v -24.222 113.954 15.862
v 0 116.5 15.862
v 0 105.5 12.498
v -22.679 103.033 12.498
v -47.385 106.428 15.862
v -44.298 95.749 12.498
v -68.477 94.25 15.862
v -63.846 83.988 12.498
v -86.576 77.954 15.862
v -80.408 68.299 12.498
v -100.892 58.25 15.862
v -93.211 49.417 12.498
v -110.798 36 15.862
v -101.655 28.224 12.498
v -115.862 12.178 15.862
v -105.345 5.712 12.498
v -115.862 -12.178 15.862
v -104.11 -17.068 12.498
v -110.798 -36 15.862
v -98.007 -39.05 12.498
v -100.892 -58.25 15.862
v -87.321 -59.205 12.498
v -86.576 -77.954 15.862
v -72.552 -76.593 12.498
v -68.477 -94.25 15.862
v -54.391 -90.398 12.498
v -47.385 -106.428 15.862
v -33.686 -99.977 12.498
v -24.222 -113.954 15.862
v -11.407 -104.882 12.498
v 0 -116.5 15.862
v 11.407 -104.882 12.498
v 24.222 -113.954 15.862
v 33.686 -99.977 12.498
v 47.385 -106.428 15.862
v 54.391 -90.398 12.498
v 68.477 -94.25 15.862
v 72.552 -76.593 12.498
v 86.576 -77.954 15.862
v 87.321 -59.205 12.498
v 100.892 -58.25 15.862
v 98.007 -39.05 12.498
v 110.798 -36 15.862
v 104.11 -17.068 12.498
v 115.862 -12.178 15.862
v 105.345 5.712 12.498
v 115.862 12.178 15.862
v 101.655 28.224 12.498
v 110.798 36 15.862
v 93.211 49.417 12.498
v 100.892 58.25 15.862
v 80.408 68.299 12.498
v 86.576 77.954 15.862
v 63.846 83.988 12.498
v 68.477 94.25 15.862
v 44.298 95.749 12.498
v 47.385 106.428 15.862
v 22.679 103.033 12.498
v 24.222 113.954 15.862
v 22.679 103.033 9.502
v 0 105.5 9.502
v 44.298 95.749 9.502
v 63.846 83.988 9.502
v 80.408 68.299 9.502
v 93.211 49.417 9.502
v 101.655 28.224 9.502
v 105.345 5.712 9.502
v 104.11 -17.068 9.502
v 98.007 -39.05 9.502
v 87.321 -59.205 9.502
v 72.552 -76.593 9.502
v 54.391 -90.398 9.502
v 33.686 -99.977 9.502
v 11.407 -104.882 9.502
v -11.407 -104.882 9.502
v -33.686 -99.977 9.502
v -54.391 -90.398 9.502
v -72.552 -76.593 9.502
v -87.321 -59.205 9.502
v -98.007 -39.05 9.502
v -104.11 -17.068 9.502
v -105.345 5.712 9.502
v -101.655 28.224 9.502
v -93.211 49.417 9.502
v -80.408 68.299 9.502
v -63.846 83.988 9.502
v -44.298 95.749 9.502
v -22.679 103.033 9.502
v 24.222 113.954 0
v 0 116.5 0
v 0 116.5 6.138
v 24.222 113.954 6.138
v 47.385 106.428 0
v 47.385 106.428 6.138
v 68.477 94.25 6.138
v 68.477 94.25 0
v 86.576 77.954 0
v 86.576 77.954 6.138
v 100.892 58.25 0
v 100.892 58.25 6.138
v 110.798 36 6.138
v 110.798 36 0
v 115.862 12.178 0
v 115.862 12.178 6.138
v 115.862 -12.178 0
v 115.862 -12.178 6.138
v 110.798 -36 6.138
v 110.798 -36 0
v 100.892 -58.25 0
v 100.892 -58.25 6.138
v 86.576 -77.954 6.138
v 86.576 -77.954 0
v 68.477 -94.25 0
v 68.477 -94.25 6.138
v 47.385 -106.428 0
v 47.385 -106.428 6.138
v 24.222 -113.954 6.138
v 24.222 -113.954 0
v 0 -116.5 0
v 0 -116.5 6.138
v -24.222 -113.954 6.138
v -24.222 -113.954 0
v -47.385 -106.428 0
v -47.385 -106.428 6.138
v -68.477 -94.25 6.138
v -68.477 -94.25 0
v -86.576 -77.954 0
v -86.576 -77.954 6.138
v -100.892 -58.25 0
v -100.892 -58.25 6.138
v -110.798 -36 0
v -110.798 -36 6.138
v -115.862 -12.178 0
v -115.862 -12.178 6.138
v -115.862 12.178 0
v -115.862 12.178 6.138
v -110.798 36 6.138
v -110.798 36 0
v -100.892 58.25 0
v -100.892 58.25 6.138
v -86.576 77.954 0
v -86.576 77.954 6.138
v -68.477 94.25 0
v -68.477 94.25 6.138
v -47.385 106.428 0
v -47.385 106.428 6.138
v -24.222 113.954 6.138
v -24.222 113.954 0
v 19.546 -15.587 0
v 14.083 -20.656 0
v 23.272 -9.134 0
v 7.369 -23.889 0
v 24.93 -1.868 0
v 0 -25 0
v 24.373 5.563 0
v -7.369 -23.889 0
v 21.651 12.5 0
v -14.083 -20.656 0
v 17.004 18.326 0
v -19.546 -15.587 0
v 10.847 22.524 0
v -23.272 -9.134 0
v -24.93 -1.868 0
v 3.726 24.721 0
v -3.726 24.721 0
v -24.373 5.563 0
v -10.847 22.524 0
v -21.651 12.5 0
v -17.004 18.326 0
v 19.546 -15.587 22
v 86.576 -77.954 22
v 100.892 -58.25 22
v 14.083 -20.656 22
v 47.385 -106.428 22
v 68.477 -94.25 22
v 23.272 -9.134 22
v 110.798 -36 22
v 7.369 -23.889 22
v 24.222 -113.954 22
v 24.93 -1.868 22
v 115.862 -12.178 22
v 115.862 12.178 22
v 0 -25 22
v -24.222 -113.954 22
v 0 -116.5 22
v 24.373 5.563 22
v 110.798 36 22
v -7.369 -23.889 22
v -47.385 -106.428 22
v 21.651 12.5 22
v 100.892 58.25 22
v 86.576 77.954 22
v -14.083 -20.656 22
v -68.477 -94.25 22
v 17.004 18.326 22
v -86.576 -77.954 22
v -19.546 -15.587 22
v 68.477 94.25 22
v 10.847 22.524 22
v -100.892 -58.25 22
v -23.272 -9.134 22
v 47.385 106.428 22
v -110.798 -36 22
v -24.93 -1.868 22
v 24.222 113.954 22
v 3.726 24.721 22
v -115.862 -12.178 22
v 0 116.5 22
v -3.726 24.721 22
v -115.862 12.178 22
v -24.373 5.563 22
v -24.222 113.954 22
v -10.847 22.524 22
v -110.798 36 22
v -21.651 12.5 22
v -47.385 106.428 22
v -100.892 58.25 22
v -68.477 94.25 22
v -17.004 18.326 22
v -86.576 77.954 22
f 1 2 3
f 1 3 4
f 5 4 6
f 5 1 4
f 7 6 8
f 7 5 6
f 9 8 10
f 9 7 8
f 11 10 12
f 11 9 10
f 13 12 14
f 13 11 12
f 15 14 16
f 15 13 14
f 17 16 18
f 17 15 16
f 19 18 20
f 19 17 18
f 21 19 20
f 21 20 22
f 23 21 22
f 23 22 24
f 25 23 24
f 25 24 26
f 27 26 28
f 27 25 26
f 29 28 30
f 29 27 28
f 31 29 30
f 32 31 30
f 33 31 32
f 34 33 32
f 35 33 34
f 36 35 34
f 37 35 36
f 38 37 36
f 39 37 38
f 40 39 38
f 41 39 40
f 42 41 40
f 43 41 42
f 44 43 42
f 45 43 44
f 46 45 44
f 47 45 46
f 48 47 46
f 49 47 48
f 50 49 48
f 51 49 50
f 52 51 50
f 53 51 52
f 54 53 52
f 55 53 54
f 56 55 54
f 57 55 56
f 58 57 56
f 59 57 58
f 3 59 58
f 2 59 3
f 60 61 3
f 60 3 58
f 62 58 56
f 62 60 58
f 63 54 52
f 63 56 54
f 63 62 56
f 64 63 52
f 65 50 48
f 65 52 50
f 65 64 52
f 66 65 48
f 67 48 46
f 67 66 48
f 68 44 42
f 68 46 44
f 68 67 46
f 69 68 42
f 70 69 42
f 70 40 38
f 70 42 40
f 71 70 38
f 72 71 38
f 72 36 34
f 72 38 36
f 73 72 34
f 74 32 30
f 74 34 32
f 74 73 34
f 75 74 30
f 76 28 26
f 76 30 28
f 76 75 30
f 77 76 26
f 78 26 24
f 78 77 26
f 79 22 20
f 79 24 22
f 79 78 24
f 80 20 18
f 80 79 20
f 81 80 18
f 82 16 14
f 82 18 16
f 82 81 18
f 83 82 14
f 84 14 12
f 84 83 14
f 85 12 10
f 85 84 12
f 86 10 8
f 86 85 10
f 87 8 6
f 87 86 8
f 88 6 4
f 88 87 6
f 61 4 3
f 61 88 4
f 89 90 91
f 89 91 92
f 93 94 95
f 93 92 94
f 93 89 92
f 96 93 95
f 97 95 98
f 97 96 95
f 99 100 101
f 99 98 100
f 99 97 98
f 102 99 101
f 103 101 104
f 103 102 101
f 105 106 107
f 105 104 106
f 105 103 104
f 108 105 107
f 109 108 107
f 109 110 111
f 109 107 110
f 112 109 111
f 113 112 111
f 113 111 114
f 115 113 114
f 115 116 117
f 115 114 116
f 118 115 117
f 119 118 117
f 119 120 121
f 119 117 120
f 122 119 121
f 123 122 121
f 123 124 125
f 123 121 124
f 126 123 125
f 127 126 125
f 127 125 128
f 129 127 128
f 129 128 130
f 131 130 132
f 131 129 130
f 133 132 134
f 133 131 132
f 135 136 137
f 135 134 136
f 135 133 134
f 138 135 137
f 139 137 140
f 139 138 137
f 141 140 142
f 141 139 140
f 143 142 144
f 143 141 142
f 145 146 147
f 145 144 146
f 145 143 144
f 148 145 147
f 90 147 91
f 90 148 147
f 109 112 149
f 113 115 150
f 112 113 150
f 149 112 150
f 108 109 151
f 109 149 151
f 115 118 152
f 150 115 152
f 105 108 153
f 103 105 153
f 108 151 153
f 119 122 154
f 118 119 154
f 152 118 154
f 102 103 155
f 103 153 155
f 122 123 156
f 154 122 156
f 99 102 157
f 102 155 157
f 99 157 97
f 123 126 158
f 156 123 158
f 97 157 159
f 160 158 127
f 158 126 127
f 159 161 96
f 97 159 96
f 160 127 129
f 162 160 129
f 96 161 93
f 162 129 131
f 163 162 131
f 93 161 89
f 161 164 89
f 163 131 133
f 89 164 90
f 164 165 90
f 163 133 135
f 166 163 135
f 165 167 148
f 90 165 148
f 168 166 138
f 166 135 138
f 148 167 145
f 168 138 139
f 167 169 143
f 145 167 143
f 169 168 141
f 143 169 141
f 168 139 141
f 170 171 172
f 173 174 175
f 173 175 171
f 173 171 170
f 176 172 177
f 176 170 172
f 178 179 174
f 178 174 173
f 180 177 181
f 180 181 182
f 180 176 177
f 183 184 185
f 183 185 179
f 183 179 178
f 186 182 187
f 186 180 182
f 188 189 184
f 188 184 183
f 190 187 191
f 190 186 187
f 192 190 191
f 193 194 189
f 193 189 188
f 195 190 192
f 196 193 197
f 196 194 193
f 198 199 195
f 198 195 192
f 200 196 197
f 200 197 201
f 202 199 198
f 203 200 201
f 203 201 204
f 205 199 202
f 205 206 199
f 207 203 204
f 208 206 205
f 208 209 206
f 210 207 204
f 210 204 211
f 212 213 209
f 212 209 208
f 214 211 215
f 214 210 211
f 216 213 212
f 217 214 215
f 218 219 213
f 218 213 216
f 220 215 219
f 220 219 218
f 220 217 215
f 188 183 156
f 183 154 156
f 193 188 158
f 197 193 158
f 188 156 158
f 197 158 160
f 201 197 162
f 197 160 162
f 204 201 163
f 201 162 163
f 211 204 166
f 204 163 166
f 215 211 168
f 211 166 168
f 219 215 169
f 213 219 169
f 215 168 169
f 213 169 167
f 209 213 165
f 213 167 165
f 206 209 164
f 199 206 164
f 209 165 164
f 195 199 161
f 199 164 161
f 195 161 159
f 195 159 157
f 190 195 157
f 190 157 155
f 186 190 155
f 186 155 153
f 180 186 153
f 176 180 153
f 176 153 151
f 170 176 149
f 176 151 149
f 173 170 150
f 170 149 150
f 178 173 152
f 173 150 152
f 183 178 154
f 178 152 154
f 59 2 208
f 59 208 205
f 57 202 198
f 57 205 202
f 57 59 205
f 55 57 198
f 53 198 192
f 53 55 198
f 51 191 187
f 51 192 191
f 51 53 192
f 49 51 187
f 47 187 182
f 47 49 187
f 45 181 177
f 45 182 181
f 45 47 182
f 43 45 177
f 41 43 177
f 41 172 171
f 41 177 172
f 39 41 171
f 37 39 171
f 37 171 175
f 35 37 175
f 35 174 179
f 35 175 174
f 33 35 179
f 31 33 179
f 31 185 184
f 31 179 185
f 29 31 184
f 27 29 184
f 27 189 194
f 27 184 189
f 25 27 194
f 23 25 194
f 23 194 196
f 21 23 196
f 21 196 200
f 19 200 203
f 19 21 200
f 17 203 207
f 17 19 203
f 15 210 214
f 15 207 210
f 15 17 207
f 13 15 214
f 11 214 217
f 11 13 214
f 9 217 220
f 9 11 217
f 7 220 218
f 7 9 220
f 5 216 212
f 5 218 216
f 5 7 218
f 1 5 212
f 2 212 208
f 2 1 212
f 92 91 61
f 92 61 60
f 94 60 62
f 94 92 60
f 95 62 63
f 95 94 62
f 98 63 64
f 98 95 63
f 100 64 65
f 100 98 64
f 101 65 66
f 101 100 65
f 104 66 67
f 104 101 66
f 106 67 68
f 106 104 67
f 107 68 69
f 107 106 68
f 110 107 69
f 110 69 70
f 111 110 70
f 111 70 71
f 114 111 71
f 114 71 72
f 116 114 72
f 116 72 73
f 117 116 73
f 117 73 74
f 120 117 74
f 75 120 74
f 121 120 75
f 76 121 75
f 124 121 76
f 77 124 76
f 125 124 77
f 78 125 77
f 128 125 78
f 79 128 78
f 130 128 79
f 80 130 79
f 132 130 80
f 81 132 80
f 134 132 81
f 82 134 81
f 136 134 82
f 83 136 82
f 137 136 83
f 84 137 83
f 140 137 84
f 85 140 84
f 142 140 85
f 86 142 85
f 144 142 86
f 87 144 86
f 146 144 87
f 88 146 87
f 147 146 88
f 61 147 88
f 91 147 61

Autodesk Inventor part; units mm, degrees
ref_plane "YZ Plane" through (0, 0, 0) normal (1, 0, 0) x (0, 1, 0)
ref_plane "XZ Plane" through (0, 0, 0) normal (0, 1, 0) x (-1, 0, 0)
sketch "Esquisse principale" plane through (0, 0, 0) normal (1, 0, 0) x (0, 1, 0)
  line L0 (0, 22) -> (116.5, 22)
  line L1 (116.5, 22) -> (116.5, 15.8615)
  line L2 (116.5, 15.8615) -> (105.5, 12.4984)
  line L3 (105.5, 12.4984) -> (105.5, 9.5016)
  line L4 (105.5, 9.5016) -> (116.5, 6.1385)
  line L5 (116.5, 6.1385) -> (116.5, 0)
  line L6 (116.5, 0) -> (0, 0)
  line L7 (114.5, 15.25) -> (114.5, 6.75) construction
  line L8 (105.5, 11) -> (114.5, 11) construction
  line L9 (116.5, 15.8615) -> (116.5, 6.1385)
  line L10 (0, -3.2) -> (0, 19.2) projected
  line L11 (0, 0) -> (0, 22)
  dimension "d0" = 8.5
  dimension "d1" = 34
  dimension "d2" = 2
  dimension "d6" = 22
  dimension "d21" = 229
  dimension "d25" = 11
  dimension "d27" = 11
ref_plane "Plan de courroie" through (0, 105.5, 11) normal (0, 0, 1) x (1, 0, 0)
revolve "Corps" add sketch "Esquisse principale" angle 360 about axis through (0, 0, -10) along (0, 0, 1)
revolve "Bord" cut sketch "Esquisse principale" angle 360 about axis through (0, 0, -10) along (0, 0, 1) contours L9 L4 L3 L2
fillet "Congé externe" [suppressed]
fillet "Congé interne" [suppressed]
pattern_of_one "Réseau de bords"
sketch "Esquisse2" plane through (0, 0, 22) normal (0, 0, 1) x (1, 0, 0)
  circle A0 centre (0, 0) radius 116.5 projected
hole "Perçage1" at (0, 0, 22) direction (0, 0, -1) diameter 50 depth 22
equation "\"d0\" = da_Bw"
equation "\"d1\" = da_Alfa"
equation "\"d2\" = da_c"
equation "\"d21\" = da_Dw"
equation "\"d25\" = da_Hd"
equation "\"d27\" = da_Se"
equation "\"da_r1\" = 0"
equation "\"da_r2\" = 0"
equation "\"d18\" = da_Sg"
equation "\"d5\" = da_Se"
equation "\"da_Bw\" = 8.5"
equation "\"da_Alfa\" = 34deg"
equation "\"da_c\" = 2"
equation "\"da_Dw\" = 229"
equation "\"da_Hd\" = 11"
equation "\"da_Se\" = 11"
equation "\"da_Sg\" = 12"
properties part number "Poulie à gorge1" material "Steel"
